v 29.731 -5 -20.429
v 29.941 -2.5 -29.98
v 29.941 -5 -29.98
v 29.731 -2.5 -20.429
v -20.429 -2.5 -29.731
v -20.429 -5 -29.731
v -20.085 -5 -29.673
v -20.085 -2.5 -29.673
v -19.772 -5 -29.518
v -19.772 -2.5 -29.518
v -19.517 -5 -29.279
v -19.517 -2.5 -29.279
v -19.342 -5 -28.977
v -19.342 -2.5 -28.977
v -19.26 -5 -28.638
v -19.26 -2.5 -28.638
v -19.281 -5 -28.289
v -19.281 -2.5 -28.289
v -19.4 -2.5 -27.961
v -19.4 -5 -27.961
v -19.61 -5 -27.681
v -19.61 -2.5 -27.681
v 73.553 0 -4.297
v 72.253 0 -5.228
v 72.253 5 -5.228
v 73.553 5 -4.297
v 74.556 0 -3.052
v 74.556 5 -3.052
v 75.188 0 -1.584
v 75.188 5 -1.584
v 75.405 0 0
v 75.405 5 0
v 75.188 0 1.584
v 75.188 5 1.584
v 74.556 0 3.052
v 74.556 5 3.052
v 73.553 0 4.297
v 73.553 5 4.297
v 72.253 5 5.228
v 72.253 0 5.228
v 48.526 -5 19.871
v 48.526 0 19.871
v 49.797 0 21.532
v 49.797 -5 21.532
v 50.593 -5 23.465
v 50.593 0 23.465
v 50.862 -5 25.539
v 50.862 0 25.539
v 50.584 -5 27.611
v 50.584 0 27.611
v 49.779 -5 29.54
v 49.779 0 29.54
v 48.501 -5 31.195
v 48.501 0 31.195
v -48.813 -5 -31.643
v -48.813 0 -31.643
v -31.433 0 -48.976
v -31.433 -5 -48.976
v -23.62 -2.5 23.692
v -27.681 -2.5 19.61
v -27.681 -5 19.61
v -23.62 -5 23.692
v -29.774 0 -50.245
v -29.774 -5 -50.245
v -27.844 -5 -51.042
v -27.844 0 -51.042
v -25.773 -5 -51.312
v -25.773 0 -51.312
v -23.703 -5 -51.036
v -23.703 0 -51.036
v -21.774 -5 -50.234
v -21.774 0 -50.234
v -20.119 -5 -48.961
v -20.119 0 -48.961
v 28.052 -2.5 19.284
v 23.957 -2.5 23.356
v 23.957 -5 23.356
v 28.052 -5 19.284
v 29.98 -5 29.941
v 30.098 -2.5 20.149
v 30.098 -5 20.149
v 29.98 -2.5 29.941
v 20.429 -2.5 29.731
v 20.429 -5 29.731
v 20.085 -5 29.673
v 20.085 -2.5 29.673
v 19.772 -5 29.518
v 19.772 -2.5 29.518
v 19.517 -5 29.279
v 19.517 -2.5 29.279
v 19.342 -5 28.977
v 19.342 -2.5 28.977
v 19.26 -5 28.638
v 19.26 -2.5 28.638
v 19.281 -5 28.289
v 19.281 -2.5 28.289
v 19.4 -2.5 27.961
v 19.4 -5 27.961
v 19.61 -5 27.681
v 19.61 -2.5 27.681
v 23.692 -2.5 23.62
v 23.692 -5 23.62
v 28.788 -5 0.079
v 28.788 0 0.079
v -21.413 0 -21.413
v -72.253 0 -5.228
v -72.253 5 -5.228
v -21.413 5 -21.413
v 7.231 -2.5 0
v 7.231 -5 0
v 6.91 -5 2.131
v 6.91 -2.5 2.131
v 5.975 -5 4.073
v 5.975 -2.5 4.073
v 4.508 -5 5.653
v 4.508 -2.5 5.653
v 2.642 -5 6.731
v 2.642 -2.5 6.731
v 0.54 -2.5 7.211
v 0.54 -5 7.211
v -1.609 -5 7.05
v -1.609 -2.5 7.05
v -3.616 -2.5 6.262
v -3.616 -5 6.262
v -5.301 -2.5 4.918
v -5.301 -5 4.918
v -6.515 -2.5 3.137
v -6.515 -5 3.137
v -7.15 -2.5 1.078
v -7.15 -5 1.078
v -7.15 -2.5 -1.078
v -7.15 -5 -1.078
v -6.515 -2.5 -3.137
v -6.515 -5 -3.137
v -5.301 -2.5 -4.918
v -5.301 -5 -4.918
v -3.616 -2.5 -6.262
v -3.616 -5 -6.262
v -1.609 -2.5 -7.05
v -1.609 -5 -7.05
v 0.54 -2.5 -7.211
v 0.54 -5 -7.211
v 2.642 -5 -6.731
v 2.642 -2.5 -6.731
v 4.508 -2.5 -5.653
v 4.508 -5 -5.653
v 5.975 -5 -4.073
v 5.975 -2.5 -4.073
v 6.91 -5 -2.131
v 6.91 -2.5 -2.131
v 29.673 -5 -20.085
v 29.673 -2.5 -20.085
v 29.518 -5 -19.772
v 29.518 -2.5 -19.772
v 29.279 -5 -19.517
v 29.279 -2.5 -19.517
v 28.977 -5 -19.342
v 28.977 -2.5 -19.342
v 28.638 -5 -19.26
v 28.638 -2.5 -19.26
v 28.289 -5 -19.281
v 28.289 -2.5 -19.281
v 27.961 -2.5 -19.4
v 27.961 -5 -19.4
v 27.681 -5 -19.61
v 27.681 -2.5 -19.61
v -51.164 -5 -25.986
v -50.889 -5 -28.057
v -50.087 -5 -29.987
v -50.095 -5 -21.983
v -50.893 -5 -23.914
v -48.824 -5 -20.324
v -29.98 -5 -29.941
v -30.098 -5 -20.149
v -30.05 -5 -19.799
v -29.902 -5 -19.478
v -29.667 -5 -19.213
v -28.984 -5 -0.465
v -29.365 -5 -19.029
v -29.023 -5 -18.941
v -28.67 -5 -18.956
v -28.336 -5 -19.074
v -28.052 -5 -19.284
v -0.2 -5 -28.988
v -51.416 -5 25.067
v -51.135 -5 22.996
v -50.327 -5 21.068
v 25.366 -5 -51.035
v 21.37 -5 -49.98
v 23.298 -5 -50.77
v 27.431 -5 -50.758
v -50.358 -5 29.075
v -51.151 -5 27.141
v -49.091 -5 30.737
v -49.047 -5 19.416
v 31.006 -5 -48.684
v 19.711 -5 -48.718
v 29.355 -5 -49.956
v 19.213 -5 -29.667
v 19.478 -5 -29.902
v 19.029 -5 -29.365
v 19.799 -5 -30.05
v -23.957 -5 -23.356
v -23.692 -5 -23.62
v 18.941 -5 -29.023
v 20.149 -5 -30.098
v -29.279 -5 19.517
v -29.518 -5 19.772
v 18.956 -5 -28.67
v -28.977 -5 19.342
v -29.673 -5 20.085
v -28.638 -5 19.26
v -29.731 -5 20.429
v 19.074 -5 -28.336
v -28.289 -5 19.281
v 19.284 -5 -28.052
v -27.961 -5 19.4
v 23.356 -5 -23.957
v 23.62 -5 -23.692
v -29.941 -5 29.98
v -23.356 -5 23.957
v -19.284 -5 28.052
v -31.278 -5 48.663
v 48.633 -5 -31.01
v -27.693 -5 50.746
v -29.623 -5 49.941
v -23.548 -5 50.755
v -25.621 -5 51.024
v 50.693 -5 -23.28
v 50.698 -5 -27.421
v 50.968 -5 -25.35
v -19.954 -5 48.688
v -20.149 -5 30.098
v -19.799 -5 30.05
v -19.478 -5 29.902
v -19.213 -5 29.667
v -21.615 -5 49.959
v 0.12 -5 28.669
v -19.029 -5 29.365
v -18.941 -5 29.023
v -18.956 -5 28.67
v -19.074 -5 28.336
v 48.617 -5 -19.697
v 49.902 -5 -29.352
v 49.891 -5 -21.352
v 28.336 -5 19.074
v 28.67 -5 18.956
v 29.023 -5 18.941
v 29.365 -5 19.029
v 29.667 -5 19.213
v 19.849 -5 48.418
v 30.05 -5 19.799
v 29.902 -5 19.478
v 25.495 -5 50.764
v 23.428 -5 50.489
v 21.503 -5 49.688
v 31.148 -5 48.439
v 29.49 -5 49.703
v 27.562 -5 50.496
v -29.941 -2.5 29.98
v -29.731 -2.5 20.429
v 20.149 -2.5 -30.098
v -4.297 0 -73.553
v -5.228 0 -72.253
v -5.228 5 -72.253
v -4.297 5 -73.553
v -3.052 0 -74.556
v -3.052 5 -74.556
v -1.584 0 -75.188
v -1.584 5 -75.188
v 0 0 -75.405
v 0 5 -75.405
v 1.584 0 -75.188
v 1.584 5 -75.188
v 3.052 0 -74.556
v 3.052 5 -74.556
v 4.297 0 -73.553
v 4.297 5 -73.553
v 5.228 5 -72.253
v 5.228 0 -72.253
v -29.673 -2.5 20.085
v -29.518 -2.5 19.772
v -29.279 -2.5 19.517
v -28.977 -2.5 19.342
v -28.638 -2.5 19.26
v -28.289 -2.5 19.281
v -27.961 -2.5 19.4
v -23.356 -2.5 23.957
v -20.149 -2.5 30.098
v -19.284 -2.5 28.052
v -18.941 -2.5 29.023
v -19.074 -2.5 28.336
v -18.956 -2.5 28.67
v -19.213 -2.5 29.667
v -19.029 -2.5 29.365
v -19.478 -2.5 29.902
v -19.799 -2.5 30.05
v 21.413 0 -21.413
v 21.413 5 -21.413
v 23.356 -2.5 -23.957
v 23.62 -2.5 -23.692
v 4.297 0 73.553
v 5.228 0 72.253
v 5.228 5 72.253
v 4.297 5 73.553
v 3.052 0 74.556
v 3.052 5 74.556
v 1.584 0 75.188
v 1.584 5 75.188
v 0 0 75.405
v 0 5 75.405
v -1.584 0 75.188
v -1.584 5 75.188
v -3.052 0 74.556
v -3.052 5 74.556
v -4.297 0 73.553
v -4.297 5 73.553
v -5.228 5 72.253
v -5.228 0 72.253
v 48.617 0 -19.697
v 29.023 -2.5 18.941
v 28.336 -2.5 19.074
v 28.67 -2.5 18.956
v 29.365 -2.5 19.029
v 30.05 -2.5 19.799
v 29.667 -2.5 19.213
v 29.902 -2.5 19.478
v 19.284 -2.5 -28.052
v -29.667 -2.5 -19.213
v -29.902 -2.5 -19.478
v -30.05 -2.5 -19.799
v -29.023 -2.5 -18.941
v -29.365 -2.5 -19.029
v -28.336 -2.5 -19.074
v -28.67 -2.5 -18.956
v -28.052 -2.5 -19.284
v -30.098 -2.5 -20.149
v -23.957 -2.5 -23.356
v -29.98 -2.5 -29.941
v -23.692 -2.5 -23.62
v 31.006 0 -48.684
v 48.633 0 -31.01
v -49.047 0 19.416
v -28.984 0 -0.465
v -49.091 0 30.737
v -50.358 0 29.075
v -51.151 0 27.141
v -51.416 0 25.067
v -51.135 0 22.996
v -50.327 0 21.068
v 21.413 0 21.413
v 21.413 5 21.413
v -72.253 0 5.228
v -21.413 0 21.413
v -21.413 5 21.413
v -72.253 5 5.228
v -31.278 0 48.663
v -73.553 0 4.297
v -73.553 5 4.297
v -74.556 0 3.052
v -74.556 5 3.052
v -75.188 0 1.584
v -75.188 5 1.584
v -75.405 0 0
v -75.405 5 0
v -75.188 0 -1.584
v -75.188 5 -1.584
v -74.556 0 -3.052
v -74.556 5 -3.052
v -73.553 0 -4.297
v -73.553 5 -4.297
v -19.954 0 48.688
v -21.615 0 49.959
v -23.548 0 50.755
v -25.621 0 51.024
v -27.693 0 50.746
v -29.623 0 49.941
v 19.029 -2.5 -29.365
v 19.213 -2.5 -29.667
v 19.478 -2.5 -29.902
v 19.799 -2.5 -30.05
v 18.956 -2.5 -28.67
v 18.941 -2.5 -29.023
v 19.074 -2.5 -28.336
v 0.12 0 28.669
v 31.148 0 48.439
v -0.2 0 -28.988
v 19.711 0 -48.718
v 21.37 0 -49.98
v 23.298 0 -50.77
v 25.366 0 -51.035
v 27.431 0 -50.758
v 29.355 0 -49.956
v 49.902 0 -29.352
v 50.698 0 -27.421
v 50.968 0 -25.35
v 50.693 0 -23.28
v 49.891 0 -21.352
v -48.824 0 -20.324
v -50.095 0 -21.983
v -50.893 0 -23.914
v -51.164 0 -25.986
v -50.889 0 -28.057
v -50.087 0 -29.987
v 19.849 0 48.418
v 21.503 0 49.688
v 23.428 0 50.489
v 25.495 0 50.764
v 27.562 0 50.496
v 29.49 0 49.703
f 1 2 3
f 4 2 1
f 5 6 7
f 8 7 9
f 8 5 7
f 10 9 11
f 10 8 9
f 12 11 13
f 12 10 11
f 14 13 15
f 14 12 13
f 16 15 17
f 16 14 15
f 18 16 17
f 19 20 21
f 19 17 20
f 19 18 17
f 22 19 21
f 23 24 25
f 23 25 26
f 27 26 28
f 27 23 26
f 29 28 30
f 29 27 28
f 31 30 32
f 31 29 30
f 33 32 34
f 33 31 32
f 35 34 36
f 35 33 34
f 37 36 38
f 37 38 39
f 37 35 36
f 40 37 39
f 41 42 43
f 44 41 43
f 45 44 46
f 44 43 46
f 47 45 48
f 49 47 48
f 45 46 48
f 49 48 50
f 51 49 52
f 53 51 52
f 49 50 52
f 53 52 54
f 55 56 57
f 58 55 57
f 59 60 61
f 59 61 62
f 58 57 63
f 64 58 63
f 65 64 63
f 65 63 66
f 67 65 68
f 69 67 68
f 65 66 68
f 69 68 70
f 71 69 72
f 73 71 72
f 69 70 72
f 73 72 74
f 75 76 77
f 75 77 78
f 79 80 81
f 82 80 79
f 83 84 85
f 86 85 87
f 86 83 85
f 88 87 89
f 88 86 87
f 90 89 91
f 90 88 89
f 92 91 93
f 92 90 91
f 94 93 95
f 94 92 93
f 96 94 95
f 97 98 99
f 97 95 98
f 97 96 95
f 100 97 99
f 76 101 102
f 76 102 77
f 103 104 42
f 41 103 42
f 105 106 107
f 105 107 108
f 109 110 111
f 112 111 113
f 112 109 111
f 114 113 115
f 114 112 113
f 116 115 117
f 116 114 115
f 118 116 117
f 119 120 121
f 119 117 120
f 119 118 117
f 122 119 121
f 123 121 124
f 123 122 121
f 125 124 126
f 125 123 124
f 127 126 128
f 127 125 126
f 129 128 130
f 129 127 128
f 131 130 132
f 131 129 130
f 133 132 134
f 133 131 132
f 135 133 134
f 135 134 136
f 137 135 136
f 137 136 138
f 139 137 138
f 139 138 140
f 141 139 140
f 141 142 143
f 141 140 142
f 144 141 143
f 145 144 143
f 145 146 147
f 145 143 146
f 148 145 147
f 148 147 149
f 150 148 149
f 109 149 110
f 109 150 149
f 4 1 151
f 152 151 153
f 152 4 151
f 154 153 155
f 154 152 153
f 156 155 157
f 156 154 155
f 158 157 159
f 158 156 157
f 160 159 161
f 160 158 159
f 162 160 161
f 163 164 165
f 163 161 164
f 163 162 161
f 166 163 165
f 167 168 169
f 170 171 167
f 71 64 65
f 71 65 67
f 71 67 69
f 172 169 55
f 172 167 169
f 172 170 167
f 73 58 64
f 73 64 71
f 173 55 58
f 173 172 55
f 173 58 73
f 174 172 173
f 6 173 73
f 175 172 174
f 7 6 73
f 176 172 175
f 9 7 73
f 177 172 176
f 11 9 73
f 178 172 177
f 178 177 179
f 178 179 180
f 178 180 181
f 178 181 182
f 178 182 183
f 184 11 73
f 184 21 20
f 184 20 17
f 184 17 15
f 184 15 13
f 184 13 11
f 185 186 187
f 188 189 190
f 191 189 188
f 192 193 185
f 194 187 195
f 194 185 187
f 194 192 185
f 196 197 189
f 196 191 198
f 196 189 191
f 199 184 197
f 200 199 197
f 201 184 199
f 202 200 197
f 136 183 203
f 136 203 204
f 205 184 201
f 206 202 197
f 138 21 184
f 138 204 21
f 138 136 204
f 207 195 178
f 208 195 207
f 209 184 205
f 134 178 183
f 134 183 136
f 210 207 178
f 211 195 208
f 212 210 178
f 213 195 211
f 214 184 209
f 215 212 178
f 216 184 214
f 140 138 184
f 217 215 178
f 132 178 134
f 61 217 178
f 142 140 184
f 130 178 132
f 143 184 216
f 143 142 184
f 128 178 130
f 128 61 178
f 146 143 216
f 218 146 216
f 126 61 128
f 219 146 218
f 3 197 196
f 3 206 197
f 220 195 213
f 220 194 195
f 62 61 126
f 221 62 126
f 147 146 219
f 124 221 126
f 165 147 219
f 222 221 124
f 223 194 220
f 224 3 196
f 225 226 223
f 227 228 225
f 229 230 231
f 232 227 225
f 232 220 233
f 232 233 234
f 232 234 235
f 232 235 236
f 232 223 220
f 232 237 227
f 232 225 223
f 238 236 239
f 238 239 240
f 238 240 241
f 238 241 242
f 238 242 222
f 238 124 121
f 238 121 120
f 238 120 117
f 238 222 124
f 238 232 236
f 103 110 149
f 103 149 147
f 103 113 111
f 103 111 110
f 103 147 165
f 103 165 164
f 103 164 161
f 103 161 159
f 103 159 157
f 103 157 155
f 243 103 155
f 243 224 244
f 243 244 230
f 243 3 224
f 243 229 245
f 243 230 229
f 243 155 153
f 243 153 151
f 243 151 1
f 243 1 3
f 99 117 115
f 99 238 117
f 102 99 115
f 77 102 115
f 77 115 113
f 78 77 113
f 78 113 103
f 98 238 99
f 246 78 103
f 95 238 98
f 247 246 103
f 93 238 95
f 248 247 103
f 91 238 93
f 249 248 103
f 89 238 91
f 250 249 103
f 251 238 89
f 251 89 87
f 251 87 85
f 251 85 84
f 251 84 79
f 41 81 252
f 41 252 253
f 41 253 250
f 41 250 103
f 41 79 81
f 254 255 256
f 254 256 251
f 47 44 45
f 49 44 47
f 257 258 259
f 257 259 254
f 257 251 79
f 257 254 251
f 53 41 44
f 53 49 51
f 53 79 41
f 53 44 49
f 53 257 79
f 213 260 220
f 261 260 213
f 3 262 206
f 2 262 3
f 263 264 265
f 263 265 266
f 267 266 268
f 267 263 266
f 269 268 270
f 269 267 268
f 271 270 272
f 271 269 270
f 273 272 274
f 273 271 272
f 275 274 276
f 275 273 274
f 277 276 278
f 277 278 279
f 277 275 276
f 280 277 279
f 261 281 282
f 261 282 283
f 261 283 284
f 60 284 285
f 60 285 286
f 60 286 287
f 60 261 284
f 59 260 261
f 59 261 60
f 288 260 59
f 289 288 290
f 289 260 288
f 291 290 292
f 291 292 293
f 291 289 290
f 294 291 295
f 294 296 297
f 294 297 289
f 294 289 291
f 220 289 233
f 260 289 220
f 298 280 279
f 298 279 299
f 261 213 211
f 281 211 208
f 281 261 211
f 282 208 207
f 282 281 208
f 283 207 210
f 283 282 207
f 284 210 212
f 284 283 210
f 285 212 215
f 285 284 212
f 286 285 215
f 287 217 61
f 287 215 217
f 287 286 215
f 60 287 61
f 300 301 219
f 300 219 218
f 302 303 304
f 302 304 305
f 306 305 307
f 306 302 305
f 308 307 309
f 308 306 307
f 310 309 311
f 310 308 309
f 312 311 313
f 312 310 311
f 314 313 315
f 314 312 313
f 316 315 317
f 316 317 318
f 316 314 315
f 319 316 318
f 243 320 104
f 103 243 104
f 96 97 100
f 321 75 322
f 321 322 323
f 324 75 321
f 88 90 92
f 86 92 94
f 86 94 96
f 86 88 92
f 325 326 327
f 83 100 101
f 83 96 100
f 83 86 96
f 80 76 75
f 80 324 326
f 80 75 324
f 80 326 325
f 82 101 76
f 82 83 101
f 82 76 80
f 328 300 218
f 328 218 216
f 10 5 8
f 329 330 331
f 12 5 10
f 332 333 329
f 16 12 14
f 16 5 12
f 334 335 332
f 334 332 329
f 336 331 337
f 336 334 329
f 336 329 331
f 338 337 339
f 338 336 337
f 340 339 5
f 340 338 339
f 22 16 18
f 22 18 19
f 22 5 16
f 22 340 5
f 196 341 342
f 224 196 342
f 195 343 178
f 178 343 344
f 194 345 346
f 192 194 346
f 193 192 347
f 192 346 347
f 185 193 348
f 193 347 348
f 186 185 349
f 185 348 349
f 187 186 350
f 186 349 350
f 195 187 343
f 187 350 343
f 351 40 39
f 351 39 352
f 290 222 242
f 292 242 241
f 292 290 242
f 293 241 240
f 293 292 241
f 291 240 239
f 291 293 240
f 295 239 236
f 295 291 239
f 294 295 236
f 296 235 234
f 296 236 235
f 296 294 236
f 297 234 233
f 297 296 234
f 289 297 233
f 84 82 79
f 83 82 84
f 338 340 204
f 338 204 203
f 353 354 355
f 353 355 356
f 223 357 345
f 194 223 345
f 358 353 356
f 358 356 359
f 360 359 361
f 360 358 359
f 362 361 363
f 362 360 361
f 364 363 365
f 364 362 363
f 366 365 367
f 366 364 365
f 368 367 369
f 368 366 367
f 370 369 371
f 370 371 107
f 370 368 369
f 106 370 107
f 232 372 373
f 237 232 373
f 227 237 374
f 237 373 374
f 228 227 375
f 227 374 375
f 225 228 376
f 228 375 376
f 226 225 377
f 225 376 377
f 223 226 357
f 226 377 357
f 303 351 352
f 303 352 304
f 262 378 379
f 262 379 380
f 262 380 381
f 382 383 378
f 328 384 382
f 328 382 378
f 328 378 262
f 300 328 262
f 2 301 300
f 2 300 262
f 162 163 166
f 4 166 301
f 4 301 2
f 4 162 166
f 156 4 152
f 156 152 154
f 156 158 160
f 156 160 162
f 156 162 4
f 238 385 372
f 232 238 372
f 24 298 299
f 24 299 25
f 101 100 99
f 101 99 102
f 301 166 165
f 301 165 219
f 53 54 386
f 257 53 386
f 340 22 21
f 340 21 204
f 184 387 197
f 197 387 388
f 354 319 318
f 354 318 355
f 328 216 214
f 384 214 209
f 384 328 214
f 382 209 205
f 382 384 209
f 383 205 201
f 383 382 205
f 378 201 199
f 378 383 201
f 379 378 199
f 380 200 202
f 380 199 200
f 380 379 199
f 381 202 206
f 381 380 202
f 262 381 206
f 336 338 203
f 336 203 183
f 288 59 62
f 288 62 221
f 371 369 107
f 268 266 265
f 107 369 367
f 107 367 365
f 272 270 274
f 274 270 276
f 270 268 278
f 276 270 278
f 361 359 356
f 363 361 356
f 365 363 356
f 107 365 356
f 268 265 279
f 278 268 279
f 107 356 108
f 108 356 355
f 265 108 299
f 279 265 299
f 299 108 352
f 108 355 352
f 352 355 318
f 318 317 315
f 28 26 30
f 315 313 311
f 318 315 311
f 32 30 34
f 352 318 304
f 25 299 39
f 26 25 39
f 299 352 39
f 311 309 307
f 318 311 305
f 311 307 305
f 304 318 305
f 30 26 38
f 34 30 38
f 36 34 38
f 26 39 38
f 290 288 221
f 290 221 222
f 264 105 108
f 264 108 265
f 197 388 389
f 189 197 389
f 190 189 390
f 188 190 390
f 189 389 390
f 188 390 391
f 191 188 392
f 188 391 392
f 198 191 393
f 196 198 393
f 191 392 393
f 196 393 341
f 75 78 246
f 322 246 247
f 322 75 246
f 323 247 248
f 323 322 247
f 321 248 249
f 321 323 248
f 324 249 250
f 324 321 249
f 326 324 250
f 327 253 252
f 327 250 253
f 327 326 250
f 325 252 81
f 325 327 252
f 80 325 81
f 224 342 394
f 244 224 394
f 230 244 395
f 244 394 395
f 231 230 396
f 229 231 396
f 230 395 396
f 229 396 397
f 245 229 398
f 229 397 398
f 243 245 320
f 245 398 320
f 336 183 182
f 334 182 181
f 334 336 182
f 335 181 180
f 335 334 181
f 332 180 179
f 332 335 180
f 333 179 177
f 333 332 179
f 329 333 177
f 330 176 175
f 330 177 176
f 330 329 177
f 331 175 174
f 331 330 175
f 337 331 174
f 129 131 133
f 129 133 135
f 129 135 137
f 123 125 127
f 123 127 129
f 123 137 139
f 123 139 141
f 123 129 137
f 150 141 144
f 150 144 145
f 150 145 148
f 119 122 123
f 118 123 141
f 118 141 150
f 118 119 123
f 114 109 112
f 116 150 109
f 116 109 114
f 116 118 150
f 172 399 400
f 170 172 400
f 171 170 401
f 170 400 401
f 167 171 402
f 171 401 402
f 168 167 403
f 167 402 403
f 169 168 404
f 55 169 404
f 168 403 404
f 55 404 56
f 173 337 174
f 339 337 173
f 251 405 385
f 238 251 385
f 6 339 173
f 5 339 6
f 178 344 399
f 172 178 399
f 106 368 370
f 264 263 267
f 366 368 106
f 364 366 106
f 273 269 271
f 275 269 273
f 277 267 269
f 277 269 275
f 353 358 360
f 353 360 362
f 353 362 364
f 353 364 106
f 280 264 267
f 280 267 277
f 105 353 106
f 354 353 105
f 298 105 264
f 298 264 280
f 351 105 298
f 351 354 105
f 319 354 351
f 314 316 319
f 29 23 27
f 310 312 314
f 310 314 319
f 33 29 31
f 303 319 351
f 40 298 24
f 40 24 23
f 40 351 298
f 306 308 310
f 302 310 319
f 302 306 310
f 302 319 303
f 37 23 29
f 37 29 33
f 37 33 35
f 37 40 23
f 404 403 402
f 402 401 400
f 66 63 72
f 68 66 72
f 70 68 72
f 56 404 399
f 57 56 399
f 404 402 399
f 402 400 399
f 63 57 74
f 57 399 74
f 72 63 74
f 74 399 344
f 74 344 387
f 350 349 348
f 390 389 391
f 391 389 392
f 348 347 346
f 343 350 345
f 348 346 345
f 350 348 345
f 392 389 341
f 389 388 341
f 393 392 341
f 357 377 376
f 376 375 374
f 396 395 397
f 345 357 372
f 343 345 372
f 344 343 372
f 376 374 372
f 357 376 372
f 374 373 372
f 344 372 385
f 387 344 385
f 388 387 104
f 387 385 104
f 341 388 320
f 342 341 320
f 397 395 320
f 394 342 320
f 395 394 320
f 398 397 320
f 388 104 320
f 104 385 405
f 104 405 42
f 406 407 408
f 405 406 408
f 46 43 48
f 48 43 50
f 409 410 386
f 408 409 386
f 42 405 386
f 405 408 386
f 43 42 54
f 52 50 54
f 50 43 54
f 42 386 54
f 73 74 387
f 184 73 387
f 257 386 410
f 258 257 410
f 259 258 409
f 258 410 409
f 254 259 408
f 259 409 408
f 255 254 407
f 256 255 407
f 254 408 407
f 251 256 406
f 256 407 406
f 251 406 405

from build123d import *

# Parameters (mm, degrees)
F1_DEPTH = 5
F3_DEPTH = 5
F5_START = 2.5
F5_DEPTH = 8.5
F7_START = 2.5
F6_R     = 7.2310724283
F7_DEPTH = 8.5


with BuildPart() as f1:
    # F0 (on Front) → F1 (new body)
    with BuildSketch(Plane.XZ):
        with BuildLine():
            Line((21.4131670789, 21.4131670789), (5.2280047051, 72.2534335794))
            ThreePointArc((5.2280047051, 72.2534335794), (0, 75.4045450825), (-5.2280047051, 72.2534335794))
            Line((-5.2280047051, 72.2534335794), (-21.4131670789, 21.4131670789))
            Line((-21.4131670789, 21.4131670789), (-72.2534335794, 5.2280047051))
            ThreePointArc((-72.2534335794, 5.2280047051), (-75.4045450825, 0), (-72.2534335794, -5.2280047051))
            Line((-72.2534335794, -5.2280047051), (-21.4131670789, -21.4131670789))
            Line((-21.4131670789, -21.4131670789), (-5.2280047051, -72.2534335794))
            ThreePointArc((-5.2280047051, -72.2534335794), (0, -75.4045450825), (5.2280047051, -72.2534335794))
            Line((5.2280047051, -72.2534335794), (21.4131670789, -21.4131670789))
            Line((21.4131670789, -21.4131670789), (72.2534335794, -5.2280047051))
            ThreePointArc((72.2534335794, -5.2280047051), (75.4045450825, 0), (72.2534335794, 5.2280047051))
            Line((72.2534335794, 5.2280047051), (21.4131670789, 21.4131670789))
        make_face()
    extrude(amount=-F1_DEPTH)


with BuildPart() as f3:
    # F2 (on Front) → F3 (new body)
    with BuildSketch(Plane.XZ):
        with BuildLine():
            Line((-31.277699336, 48.6629582628), (-49.090822423, 30.737120276))
            ThreePointArc((-49.090822423, 30.737120276), (-51.4160960352, 25.0672655385), (-49.0471358303, 19.4155244207))
            Line((-49.0471358303, 19.4155244207), (-28.9843474062, -0.4649805087))
            Line((-28.9843474062, -0.4649805087), (0.1201800308, 28.6688587734))
            Line((0.1201800308, 28.6688587734), (-19.9538588542, 48.6884972941))
            ThreePointArc((-19.9538588542, 48.6884972941), (-25.6210751239, 51.0239525147), (-31.277699336, 48.6629582628))
        make_face()
        Polygon((0.1201800308, 28.6688587734), (-28.9843474062, -0.4649805087), (-0.2002107731, -28.9875945206), (28.7876704154, 0.0790568862), align=None)
        with BuildLine():
            Line((-0.2002107731, -28.9875945206), (-28.9843474062, -0.4649805087))
            Line((-28.9843474062, -0.4649805087), (-48.8237758072, -20.3243896585))
            ThreePointArc((-48.8237758072, -20.3243896585), (-51.1640716736, -25.985836605), (-48.8132487851, -31.6429204843))
            Line((-48.8132487851, -31.6429204843), (-31.4329527263, -48.9761161842))
            ThreePointArc((-31.4329527263, -48.9761161842), (-25.7729244329, -51.311584387), (-20.1192546415, -48.9607654024))
            Line((-20.1192546415, -48.9607654024), (-0.2002107731, -28.9875945206))
        make_face()
        with BuildLine():
            Line((19.8494466376, 48.4179951825), (0.1201800308, 28.6688587734))
            Line((0.1201800308, 28.6688587734), (28.7876704154, 0.0790568862))
            Line((28.7876704154, 0.0790568862), (48.5262871236, 19.8713103241))
            ThreePointArc((48.5262871236, 19.8713103241), (50.8617423442, 25.5385265938), (48.5007480923, 31.1951508059))
            Line((48.5007480923, 31.1951508059), (31.1481327132, 48.4386556204))
            ThreePointArc((31.1481327132, 48.4386556204), (25.494518776, 50.7639754154), (19.8494466376, 48.4179951825))
        make_face()
        with BuildLine():
            Line((28.7876704154, 0.0790568862), (-0.2002107731, -28.9875945206))
            Line((-0.2002107731, -28.9875945206), (19.7109541182, -48.7178535157))
            ThreePointArc((19.7109541182, -48.7178535157), (25.365615745, -51.0352080118), (31.0064587891, -48.6844167139))
            Line((31.0064587891, -48.6844167139), (48.6325484943, -31.0104307543))
            ThreePointArc((48.6325484943, -31.0104307543), (50.968016697, -25.3504024609), (48.6171977124, -19.6967326695))
            Line((48.6171977124, -19.6967326695), (28.7876704154, 0.0790568862))
        make_face()
    extrude(amount=F3_DEPTH)

    # F4 (on face) → F5 (cut)
    with BuildSketch(Plane.XZ.offset(F5_START)):
        with BuildLine():
            Line((23.9573915824, 23.3561819747), (28.0515903028, 19.2837442446))
            ThreePointArc((28.0515903028, 19.2837442446), (29.3652228471, 19.0292852531), (30.0977672028, 20.1489988801))
            Line((30.0977672028, 20.1489988801), (29.9796951878, 29.9410294803))
            Line((29.9796951878, 29.9410294803), (20.4294664941, 29.7314289244))
            ThreePointArc((20.4294664941, 29.7314289244), (19.3415750826, 28.9772624843), (19.6095326382, 27.6809317043))
            Line((19.6095326382, 27.6809317043), (23.692213428, 23.6199506861))
            Line((23.692213428, 23.6199506861), (23.9573915824, 23.3561819747))
        make_face()
        with BuildLine():
            Line((-23.6199506861, 23.692213428), (-23.3561819747, 23.9573915824))
            Line((-23.3561819747, 23.9573915824), (-19.2837442446, 28.0515903028))
            ThreePointArc((-19.2837442446, 28.0515903028), (-19.0292852531, 29.3652228471), (-20.1489988801, 30.0977672028))
            Line((-20.1489988801, 30.0977672028), (-29.9410294803, 29.9796951878))
            Line((-29.9410294803, 29.9796951878), (-29.7314289244, 20.4294664941))
            ThreePointArc((-29.7314289244, 20.4294664941), (-28.9772624843, 19.3415750826), (-27.6809317043, 19.6095326382))
            Line((-27.6809317043, 19.6095326382), (-23.6199506861, 23.692213428))
        make_face()
        with BuildLine():
            Line((-23.692213428, -23.6199506861), (-23.9573915824, -23.3561819747))
            Line((-23.9573915824, -23.3561819747), (-28.0515903028, -19.2837442446))
            ThreePointArc((-28.0515903028, -19.2837442446), (-29.3652228471, -19.0292852531), (-30.0977672028, -20.1489988801))
            Line((-30.0977672028, -20.1489988801), (-29.9796951878, -29.9410294803))
            Line((-29.9796951878, -29.9410294803), (-20.4294664941, -29.7314289244))
            ThreePointArc((-20.4294664941, -29.7314289244), (-19.3415750826, -28.9772624843), (-19.6095326382, -27.6809317043))
            Line((-19.6095326382, -27.6809317043), (-23.692213428, -23.6199506861))
        make_face()
        with BuildLine():
            Line((23.6199506861, -23.692213428), (23.3561819747, -23.9573915824))
            Line((23.3561819747, -23.9573915824), (19.2837442446, -28.0515903028))
            ThreePointArc((19.2837442446, -28.0515903028), (19.0292852531, -29.3652228471), (20.1489988801, -30.0977672028))
            Line((20.1489988801, -30.0977672028), (29.9410294803, -29.9796951878))
            Line((29.9410294803, -29.9796951878), (29.7314289244, -20.4294664941))
            ThreePointArc((29.7314289244, -20.4294664941), (28.9772624843, -19.3415750826), (27.6809317043, -19.6095326382))
            Line((27.6809317043, -19.6095326382), (23.6199506861, -23.692213428))
        make_face()
    extrude(amount=F5_DEPTH, mode=Mode.SUBTRACT)

    # F6 (on Front) → F7 (cut)
    with BuildSketch(Plane.XZ.offset(F7_START)):
        Circle(F6_R)
    extrude(amount=F7_DEPTH, mode=Mode.SUBTRACT)


solid = Compound([f1.part, f3.part])
